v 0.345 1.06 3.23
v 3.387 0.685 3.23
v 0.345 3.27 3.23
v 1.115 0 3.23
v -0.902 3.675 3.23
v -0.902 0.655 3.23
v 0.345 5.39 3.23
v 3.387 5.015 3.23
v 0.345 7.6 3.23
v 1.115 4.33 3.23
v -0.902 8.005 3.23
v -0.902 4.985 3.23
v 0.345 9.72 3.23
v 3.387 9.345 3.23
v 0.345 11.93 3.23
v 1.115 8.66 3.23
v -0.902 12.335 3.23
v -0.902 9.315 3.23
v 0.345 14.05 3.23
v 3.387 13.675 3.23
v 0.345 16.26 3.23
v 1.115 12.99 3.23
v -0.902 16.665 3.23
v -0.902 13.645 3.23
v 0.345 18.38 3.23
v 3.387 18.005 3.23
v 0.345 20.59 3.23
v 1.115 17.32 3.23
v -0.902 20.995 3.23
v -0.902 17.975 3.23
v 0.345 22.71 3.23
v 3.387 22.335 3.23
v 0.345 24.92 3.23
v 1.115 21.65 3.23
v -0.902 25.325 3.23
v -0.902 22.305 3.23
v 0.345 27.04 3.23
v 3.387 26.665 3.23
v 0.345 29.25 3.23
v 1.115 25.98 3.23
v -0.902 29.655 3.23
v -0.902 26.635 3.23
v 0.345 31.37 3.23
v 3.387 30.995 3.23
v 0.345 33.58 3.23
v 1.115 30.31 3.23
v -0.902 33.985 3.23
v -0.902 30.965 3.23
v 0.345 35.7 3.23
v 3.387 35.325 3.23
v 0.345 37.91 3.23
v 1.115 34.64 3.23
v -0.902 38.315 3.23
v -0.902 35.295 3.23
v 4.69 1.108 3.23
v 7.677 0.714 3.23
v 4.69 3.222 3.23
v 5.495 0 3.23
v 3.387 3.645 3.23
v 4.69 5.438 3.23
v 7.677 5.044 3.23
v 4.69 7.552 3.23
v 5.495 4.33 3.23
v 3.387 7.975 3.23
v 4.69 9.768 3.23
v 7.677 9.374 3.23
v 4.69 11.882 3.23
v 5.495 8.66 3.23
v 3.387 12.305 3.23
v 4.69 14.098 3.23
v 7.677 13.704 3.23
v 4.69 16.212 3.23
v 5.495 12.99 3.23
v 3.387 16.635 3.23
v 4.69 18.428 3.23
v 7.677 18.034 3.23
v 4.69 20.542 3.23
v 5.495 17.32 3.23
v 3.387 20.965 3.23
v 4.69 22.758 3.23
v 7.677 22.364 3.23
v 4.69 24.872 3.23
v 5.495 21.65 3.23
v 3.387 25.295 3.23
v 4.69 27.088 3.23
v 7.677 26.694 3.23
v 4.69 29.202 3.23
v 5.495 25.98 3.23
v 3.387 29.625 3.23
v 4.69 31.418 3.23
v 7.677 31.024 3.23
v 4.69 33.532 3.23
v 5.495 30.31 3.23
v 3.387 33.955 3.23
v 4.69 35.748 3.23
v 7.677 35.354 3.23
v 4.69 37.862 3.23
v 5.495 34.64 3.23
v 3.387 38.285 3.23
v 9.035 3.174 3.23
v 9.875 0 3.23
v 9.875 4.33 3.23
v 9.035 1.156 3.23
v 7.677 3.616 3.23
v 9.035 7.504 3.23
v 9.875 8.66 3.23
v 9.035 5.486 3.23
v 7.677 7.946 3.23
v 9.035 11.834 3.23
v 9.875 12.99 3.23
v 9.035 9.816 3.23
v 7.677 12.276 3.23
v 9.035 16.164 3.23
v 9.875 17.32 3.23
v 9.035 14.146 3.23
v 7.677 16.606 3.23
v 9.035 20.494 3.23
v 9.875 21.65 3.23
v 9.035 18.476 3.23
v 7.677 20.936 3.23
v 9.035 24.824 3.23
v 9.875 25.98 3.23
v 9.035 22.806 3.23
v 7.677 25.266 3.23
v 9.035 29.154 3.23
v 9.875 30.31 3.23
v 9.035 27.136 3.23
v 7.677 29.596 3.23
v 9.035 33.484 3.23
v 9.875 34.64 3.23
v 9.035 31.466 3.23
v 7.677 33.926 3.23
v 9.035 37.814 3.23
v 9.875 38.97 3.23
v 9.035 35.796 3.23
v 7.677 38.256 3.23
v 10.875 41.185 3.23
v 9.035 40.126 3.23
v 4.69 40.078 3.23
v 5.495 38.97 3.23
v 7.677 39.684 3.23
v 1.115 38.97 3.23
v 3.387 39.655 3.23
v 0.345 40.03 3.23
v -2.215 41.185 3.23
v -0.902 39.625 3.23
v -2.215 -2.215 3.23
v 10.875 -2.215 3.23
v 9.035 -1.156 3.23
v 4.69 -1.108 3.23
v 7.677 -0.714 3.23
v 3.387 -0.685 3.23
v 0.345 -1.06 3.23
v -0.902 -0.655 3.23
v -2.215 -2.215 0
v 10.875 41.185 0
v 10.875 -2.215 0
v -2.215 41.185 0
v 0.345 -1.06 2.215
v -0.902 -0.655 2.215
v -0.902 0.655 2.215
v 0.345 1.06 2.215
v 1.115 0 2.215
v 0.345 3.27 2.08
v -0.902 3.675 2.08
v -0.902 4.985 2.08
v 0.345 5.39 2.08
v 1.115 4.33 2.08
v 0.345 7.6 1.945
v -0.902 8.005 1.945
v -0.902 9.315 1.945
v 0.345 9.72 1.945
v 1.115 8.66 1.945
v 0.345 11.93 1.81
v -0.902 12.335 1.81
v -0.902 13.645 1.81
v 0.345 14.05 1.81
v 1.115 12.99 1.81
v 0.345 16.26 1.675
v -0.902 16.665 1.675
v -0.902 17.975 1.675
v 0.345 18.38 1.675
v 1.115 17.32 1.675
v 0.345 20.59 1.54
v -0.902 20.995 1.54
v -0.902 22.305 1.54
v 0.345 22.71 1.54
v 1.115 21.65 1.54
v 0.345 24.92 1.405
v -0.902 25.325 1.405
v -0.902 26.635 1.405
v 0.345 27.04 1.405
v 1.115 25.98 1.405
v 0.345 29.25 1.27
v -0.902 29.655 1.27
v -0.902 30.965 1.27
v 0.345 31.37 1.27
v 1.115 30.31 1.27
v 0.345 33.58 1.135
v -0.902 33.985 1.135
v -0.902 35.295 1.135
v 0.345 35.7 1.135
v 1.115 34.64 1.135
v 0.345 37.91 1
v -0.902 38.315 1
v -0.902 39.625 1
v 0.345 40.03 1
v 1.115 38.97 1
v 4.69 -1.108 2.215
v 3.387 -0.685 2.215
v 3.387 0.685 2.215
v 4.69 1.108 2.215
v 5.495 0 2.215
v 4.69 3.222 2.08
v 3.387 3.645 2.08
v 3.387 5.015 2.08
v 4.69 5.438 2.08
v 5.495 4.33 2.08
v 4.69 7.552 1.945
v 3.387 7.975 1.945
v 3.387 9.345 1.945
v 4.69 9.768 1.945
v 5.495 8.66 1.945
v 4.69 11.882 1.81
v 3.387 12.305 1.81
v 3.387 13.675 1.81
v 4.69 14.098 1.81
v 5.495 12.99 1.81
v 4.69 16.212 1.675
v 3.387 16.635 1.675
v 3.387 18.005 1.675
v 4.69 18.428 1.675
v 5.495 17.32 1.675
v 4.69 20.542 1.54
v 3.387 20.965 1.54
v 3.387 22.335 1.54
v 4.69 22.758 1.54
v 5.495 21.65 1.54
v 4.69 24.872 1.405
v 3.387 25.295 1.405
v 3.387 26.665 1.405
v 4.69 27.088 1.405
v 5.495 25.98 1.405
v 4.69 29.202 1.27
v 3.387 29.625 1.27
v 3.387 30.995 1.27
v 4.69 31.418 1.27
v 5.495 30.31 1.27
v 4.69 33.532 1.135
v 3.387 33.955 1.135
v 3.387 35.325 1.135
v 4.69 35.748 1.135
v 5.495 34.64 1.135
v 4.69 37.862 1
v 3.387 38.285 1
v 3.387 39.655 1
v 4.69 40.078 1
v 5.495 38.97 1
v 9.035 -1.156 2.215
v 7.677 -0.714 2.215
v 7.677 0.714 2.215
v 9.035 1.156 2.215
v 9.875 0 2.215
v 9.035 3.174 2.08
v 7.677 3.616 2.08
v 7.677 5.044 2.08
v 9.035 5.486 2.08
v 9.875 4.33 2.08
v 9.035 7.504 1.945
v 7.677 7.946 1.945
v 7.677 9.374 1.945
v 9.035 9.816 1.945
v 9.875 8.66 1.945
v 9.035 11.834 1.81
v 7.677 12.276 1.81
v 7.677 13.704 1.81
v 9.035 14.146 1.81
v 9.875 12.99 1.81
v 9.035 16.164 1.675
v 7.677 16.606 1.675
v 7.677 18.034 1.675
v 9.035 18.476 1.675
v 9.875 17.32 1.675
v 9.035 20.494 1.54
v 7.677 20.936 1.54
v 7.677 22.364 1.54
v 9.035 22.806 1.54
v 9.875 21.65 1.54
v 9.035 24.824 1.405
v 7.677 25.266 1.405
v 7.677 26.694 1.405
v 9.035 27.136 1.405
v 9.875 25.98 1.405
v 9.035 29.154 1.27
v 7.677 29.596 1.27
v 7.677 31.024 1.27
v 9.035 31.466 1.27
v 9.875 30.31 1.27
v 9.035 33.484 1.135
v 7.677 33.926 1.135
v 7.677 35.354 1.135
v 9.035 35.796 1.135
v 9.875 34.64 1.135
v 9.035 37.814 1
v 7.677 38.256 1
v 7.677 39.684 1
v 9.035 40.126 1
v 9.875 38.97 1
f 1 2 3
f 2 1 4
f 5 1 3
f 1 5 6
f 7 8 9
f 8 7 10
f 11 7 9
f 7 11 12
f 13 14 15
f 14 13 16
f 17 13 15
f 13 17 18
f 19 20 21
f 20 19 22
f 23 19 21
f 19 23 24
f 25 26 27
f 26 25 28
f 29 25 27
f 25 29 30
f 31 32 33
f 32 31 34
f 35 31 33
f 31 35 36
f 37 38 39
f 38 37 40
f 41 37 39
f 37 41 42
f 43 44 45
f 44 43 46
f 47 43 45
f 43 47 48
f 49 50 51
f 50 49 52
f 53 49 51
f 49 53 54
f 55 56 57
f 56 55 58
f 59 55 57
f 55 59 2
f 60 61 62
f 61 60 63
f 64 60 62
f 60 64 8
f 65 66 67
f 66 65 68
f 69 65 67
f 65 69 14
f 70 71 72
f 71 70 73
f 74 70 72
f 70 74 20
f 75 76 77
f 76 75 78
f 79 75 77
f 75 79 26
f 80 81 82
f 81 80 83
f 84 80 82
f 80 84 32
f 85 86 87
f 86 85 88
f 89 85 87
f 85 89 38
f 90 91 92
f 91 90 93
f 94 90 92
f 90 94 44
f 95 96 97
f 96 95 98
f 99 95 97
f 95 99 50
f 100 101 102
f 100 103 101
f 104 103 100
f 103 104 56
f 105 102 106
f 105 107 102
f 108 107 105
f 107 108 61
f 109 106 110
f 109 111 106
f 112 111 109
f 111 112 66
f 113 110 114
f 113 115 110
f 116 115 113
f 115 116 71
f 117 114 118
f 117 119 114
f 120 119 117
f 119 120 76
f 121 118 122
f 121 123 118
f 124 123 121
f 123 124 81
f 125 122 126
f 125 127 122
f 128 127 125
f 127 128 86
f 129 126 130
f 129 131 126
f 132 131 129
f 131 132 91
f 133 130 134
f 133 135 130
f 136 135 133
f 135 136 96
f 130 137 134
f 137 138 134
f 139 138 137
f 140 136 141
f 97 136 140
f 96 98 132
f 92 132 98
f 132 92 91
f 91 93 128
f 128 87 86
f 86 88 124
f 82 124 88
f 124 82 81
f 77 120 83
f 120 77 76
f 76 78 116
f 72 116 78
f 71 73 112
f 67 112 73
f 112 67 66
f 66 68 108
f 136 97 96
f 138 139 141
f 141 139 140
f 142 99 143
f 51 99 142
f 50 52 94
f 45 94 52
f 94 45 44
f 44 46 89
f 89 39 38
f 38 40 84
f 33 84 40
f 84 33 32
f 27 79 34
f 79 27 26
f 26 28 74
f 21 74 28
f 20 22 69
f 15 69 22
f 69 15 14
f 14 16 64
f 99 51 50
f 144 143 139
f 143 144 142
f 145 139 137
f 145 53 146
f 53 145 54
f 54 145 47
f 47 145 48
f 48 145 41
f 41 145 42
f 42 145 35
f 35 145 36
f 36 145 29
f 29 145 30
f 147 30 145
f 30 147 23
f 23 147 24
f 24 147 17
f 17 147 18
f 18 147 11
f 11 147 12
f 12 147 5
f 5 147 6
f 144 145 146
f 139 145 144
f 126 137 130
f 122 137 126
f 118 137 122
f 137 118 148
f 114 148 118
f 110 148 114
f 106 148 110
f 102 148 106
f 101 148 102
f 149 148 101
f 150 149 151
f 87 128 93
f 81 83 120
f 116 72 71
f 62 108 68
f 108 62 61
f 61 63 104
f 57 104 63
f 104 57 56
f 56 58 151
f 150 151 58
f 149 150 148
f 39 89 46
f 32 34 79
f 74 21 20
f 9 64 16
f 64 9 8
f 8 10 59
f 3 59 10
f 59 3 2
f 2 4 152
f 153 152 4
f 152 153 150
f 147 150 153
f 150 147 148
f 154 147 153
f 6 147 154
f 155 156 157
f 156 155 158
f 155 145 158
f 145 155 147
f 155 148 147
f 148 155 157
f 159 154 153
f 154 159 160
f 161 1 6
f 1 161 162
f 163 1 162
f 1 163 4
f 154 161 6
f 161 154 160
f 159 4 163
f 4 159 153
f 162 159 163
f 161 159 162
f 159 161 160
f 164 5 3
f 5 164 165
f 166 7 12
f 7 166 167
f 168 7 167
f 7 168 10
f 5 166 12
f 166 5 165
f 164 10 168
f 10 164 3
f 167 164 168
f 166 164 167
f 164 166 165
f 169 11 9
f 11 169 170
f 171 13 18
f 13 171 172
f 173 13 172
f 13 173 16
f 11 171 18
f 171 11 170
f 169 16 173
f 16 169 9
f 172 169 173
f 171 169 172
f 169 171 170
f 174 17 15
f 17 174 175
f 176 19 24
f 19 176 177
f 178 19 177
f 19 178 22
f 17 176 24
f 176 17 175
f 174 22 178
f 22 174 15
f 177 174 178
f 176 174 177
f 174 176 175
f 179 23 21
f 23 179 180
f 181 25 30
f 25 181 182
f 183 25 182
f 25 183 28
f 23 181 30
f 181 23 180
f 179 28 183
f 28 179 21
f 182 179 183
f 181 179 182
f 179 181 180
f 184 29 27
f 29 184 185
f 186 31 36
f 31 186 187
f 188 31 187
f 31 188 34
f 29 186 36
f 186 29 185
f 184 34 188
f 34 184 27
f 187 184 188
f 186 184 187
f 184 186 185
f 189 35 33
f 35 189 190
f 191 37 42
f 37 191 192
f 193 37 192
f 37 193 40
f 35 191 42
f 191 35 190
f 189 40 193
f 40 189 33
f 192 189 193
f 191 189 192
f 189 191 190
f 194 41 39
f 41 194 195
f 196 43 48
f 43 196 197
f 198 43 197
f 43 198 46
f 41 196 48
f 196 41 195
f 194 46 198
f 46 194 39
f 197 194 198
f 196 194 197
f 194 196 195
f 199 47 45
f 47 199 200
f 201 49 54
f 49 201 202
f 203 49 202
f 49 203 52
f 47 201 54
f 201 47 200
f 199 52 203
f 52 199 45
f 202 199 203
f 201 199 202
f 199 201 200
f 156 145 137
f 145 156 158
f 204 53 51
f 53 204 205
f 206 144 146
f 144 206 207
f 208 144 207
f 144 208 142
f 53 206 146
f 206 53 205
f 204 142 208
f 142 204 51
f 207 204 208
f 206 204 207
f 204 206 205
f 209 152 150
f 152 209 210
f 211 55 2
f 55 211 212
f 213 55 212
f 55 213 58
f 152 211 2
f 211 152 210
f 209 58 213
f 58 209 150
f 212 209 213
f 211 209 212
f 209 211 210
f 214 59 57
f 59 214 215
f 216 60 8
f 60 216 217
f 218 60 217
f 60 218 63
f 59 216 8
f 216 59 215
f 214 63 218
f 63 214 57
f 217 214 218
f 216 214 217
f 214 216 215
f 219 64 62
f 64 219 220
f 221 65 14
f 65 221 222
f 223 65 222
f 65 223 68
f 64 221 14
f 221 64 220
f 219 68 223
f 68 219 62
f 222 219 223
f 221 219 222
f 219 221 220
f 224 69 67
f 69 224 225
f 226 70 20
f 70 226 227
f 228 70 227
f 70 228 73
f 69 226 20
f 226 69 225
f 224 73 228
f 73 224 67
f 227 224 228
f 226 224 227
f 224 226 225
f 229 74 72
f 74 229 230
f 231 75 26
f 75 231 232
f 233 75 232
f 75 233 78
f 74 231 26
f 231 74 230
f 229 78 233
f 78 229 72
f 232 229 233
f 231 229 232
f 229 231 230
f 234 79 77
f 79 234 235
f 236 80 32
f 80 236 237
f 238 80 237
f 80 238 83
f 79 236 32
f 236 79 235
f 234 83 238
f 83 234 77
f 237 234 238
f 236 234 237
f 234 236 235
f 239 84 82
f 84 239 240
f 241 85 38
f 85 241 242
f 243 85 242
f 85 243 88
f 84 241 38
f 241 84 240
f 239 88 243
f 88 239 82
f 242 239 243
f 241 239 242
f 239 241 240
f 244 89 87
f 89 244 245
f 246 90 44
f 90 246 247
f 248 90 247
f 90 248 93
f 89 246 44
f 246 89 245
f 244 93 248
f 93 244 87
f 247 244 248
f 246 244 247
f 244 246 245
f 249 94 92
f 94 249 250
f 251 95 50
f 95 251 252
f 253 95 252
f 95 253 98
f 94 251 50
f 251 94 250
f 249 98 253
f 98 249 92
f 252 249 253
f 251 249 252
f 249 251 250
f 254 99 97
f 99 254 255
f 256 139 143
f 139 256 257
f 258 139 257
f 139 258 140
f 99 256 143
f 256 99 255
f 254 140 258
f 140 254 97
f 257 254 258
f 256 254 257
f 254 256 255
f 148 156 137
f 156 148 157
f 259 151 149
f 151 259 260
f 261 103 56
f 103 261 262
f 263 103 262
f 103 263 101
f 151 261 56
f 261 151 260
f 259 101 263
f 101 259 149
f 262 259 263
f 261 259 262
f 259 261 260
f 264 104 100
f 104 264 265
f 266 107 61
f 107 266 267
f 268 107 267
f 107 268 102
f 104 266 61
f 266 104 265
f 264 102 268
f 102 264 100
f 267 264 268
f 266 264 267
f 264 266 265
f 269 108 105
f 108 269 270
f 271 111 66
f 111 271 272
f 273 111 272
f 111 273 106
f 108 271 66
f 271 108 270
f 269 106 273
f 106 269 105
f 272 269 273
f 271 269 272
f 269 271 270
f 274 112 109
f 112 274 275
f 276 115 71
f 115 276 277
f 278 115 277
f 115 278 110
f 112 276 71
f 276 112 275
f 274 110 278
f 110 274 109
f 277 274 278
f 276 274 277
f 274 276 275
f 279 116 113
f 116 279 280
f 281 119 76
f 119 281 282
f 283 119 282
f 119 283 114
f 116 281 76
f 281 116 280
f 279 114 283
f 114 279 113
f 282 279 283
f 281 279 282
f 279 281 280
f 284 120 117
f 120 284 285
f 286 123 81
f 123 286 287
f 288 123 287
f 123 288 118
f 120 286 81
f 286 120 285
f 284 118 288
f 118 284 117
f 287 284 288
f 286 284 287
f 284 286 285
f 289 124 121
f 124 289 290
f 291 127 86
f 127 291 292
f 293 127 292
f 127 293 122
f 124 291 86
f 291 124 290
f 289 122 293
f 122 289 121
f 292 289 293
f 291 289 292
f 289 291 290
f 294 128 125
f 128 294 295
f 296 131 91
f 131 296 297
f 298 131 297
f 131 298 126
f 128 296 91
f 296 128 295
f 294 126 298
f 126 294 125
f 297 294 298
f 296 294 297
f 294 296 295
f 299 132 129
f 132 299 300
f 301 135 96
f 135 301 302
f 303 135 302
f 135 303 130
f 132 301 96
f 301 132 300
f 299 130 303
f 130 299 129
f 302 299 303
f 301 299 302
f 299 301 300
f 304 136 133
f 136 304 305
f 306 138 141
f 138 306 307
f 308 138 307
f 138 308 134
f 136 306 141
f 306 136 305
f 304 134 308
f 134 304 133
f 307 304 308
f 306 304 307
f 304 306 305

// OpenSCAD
r = 2.03/2;  // radius of sphere
pad = 1;     // padding size
lap = .1;    // overlap (to ensure union, difference don't get confused)

// The steel balls with diameter .080" = 2.03 mm fit snugly into a hole with
// radius r + gap for gap = [ 0.10, 0.15, 0.20 ]; tested at [-0.2:0.05:0.5]
// They poke out with a stable fit for depths r + [0.135, 0.27]
// seems the best fit is
//  radius = r + .15
//  depth  = r + .15

//gaps = [-.2,-.1,0,.1,.2,.3,.4,.5];
gmin  = 0.1;
gmax  = 0.2;
gstep = 0.05;
gaps  = [gmin:gstep:gmax];
nsteps = (gmax - gmin)/gstep + 1;
echo("nsteps", nsteps);

//depths = [r, ... 2*(r+gmax)];
dmin = r;
dmax = 2*r + gmax;
ndepths = 10;
dstep = (dmax - dmin)/(ndepths - 1);
depths = [dmin:dstep:dmax];
echo("dstep", dstep);

l = 2*(pad + r + gmax);
echo("l", l);

bheight = dmax + pad;

module base(depth){
    translate([0, 0, bheight/2]) // center for x, y, but move up so bottom is at z=0
    cube([l, l, bheight], center=true);
}

cheight = dmax + pad;
echo(cheight);
module hole(w){
    translate([0, 0, cheight/2]) // center for x, y, but move up so bottom is at z=0
    cylinder(h=cheight, r=w, center=true);
}

for(gap=gaps, depth=depths){
    //echo("gap", gap);
    //echo("dep", depth-r);
    i = (gap-gmin)/gstep;
    j = (depth-dmin)/dstep;
    w = r + gap;
    translate([(l-lap)*i, (l-lap)*j, 0]){
        difference(){
            base();
            translate([0, 0, bheight-depth])
            hole(w);
        }
    }
}
